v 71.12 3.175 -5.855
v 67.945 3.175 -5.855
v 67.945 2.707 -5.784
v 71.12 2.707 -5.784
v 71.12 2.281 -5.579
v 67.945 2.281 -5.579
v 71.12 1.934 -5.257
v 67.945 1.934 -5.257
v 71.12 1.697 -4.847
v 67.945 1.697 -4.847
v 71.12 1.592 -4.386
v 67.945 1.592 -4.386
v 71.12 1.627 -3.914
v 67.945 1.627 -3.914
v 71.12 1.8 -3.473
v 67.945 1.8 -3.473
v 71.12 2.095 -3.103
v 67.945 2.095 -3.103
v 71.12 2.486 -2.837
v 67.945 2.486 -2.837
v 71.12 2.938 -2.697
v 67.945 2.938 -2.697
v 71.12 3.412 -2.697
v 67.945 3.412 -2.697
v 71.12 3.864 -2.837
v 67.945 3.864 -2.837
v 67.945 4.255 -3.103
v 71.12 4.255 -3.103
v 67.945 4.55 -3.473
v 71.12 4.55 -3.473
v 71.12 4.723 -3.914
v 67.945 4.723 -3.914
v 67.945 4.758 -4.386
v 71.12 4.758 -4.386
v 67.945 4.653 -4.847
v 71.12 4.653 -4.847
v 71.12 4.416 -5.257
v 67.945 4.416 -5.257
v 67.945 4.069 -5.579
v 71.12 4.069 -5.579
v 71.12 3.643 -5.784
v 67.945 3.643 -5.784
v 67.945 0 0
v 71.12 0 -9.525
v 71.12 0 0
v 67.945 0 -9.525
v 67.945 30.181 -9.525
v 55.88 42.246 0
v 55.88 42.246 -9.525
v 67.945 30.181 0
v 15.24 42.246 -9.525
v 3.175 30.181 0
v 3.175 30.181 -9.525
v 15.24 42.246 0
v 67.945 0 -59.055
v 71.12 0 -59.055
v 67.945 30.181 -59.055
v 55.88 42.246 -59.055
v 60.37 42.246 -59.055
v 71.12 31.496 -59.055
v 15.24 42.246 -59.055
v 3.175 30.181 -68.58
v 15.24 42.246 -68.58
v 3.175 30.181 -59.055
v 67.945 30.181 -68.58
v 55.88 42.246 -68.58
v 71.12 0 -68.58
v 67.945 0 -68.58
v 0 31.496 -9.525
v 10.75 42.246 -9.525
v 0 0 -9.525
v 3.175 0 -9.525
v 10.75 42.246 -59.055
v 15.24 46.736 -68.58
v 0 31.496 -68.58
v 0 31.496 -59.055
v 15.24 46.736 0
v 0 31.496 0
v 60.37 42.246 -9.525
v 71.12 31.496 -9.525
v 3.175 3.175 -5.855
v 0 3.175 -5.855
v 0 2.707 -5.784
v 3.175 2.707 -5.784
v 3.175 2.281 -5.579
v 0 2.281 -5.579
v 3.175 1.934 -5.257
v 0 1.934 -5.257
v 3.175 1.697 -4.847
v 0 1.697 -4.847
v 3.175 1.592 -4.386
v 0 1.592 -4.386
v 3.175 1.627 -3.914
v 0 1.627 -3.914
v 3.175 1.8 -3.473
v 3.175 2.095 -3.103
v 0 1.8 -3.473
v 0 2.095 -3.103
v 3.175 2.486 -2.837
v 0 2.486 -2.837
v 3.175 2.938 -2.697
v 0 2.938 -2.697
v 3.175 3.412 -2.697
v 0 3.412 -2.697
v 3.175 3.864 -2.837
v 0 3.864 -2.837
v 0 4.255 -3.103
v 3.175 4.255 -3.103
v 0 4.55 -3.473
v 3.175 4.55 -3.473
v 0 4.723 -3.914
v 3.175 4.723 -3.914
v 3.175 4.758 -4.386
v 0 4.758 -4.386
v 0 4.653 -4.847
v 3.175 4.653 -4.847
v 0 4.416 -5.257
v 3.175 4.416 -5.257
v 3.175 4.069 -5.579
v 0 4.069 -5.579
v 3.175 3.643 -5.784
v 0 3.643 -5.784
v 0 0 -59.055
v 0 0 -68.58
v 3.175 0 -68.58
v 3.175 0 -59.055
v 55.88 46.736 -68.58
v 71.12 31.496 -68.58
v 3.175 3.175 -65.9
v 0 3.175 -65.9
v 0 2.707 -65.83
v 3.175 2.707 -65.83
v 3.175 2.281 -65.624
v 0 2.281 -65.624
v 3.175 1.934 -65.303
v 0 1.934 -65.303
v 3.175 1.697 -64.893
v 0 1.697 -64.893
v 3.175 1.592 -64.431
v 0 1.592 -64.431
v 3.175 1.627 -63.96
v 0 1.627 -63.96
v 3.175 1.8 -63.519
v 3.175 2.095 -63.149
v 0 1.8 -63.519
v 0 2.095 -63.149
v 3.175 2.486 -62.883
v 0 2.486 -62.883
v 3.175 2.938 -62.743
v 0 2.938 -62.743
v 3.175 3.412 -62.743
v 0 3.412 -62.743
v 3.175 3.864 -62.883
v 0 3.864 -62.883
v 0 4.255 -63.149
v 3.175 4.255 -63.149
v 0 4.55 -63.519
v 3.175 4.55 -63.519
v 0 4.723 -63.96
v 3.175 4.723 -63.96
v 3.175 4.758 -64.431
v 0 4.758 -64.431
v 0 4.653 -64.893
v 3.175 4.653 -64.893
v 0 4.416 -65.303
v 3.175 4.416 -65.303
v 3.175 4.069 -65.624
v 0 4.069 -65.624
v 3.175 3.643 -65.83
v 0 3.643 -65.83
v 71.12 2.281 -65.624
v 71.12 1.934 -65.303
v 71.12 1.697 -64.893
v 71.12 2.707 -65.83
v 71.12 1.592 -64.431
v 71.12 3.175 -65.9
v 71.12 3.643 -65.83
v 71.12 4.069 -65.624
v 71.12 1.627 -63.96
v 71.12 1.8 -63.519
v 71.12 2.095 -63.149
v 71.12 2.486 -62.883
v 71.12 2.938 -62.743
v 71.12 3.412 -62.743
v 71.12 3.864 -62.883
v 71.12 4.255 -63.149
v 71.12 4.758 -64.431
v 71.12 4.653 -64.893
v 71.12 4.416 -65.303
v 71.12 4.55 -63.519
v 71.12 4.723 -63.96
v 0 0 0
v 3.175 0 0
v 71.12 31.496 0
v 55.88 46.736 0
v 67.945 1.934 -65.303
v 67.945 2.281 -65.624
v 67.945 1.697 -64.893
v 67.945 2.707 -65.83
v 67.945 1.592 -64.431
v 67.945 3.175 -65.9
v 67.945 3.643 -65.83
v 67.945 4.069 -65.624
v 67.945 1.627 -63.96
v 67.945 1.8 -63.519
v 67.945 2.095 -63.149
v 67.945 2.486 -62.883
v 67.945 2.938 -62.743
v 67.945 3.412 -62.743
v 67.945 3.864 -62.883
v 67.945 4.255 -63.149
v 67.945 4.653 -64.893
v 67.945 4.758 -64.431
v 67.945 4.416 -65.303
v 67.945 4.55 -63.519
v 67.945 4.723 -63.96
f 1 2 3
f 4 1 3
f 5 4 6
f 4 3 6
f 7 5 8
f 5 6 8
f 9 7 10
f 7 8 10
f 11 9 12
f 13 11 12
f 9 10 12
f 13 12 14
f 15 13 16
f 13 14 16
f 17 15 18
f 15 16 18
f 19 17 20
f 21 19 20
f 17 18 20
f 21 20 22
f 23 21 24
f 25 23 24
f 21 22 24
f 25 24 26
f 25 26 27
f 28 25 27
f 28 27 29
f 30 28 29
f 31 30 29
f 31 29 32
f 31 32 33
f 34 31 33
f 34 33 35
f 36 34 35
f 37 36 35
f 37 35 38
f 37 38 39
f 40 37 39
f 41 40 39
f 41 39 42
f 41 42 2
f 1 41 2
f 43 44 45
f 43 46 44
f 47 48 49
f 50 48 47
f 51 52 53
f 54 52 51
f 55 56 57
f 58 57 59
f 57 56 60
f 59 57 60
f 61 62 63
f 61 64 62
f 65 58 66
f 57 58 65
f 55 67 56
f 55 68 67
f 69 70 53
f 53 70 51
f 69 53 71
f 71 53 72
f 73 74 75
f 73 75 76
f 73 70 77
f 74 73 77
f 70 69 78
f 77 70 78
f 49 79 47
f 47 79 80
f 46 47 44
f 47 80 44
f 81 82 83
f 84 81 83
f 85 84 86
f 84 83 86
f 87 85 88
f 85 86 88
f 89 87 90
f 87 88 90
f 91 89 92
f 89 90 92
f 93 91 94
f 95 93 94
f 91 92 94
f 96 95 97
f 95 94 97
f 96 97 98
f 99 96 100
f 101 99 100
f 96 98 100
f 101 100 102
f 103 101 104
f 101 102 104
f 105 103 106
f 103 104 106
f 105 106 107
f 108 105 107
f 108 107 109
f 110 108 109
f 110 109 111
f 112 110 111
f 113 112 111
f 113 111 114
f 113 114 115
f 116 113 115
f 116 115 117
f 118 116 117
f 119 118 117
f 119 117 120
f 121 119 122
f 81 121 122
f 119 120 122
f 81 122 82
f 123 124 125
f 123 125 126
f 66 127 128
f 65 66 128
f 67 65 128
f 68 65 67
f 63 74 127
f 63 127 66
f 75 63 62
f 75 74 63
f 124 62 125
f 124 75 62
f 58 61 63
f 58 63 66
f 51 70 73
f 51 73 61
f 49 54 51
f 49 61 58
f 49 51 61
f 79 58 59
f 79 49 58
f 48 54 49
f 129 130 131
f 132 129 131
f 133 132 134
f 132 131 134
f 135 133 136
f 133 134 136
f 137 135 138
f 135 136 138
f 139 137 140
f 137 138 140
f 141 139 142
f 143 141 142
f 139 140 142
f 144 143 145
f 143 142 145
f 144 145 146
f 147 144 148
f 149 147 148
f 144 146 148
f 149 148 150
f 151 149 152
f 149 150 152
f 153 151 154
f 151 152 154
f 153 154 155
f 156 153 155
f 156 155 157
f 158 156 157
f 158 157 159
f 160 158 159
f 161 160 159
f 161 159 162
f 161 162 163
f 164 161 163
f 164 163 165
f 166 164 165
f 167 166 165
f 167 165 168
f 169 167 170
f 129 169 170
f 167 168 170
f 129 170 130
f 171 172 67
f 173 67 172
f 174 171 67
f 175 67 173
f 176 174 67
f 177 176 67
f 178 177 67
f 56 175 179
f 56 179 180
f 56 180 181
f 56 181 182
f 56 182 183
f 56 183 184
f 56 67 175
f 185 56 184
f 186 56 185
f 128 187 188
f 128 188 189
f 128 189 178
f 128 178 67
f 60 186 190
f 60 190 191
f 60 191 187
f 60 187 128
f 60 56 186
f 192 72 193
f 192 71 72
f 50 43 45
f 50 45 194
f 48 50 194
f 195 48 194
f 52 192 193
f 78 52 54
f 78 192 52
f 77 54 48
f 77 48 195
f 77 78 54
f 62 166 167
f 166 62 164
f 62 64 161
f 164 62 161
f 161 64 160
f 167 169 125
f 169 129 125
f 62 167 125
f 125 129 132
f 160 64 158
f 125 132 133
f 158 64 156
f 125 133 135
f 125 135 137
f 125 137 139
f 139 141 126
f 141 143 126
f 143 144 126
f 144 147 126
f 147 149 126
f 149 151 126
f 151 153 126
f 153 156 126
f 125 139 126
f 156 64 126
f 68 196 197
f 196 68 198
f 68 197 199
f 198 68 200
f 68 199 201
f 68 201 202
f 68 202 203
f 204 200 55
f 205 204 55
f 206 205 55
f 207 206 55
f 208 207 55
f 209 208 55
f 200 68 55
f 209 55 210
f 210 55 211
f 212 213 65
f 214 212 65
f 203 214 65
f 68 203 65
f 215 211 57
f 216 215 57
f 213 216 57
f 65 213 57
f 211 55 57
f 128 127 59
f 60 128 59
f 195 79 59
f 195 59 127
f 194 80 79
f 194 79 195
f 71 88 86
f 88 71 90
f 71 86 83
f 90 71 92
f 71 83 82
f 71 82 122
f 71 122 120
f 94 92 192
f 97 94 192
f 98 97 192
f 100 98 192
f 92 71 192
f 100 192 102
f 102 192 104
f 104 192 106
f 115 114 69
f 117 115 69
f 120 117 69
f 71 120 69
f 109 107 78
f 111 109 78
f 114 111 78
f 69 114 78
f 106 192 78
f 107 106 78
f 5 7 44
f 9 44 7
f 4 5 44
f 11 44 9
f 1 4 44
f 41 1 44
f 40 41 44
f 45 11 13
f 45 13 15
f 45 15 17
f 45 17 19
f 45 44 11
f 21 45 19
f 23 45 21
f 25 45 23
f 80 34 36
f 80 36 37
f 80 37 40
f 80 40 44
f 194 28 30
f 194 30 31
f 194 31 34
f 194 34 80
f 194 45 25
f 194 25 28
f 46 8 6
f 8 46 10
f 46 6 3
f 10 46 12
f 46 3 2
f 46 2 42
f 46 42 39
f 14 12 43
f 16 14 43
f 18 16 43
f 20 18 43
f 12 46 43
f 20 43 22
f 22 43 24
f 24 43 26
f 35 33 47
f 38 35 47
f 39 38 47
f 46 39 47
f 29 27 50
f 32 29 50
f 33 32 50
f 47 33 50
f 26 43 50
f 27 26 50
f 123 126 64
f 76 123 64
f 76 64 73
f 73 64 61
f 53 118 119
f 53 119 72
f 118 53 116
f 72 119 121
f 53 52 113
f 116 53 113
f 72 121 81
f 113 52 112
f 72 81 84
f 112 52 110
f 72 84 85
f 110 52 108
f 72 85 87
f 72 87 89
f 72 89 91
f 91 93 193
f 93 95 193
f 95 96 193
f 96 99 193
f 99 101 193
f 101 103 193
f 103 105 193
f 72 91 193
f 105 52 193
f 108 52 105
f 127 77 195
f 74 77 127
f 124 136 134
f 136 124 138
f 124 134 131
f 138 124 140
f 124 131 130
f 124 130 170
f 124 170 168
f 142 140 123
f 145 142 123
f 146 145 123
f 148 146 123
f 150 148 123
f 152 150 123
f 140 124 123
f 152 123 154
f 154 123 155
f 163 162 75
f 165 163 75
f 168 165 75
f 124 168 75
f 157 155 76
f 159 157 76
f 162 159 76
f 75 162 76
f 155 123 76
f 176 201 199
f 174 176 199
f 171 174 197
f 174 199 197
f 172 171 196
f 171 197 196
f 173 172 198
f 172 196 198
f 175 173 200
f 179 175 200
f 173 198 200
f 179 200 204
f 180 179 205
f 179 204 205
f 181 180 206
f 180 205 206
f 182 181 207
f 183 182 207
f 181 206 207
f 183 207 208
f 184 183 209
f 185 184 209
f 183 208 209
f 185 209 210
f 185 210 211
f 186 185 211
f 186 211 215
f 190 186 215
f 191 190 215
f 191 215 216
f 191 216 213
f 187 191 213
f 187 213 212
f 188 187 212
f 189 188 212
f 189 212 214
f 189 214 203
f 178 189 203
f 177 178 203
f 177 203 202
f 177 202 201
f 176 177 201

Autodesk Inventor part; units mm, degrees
ref_plane "YZ Plane" through (0, 0, 0) normal (1, 0, 0) x (0, 1, 0)
ref_plane "XZ Plane" through (0, 0, 0) normal (0, 1, 0) x (-1, 0, 0)
ref_plane "XY Plane" through (0, 0, 0) normal (0, 0, 1) x (1, 0, 0)
sketch "Sketch1" plane through (0, 0, 0) normal (1, 0, 0) x (0, 1, 0)
  line L0 (0, 0) -> (46.736, 0)
  line L1 (46.736, 0) -> (46.736, -68.58)
  line L2 (46.736, -68.58) -> (0, -68.58)
  line L3 (0, -68.58) -> (0, 0)
  dimension "d0" = 46.736
  dimension "d1" = 68.58
extrude "Extrusion1" add sketch "Sketch1" along normal blind 71.12
chamfer "Chamfer1" distance 15.24 angle 45 2 edges at (0, 46.736, -34.29) (71.12, 46.736, -34.29)
sketch "Sketch2" plane through (0, 0, 0) normal (0, 0, 1) x (1, 0, 0)
  line L0 (55.88, 46.736) -> (71.12, 31.496) projected
  line L1 (15.24, 46.736) -> (55.88, 46.736) projected
  line L2 (0, 31.496) -> (15.24, 46.736) projected
  line L3 (0, 0) -> (0, 31.496) projected
  line L4 (0, 0) -> (71.12, 0) projected
  line L5 (71.12, 31.496) -> (71.12, 0) projected
  line L6 (0, 0) -> (71.12, 0) projected
  line L7 (15.24, 42.2459) -> (55.88, 42.2459)
  line L8 (57.658, 0) -> (15.24, 0)
  line L9 (3.175, 0) -> (67.945, 0)
  line L10 (67.945, 0) -> (67.945, 30.1809)
  line L11 (3.175, 30.1809) -> (3.175, 0)
  line L12 (3.175, 30.1809) -> (15.24, 42.2459)
  line L13 (55.88, 42.2459) -> (67.945, 30.1809)
  dimension "d12" = 3.175
  dimension "d13" = 3.175
  dimension "d36" = 3.175
  dimension "d37" = 3.175
  dimension "d38" = 3.175
  dimension "d39" = 3.175
extrude "Extrusion2" cut sketch "Sketch2" against normal blind 127 contours L4 L11 L12 L7 L13 L10
sketch "Sketch3" plane through (71.12, 0, 0) normal (1, 0, 0) x (0, 0, -1)
  line L0 (0, 31.496) -> (68.58, 31.496) projected
  line L1 (0, 31.496) -> (0, 0) projected
  line L2 (0, 0) -> (68.58, 0) projected
  line L3 (68.58, 0) -> (68.58, 31.496) projected
  line L4 (4.2672, 3.175) -> (64.3128, 3.175)
  line L5 (64.3128, 3.175) -> (64.3128, 19.177)
  line L6 (64.3128, 19.177) -> (4.2672, 19.177)
  line L7 (4.2672, 19.177) -> (4.2672, 3.175)
  dimension "d16" = 60.0456
  dimension "d17" = 68.58
  dimension "d18" = 4.2672
  dimension "d19" = 16.002
  dimension "d20" = 31.496
  dimension "d21" = 3.175
hole "Hole2" at (71.12, 3.175, -4.2672) at (71.12, 3.175, -64.3128) direction (-1, 0, 0) diameter 3.175 end through all
sketch "Sketch4" plane through (71.12, 0, 0) normal (1, 0, 0) x (0, 0, -1)
  circle A0 centre (4.2672, 3.175) radius 1.5875 projected
  circle A1 centre (64.3128, 3.175) radius 1.5875 projected
  line L0 (0, 31.496) -> (68.58, 31.496) projected
  line L1 (0, 31.496) -> (0, 0) projected
  line L2 (0, 0) -> (68.58, 0) projected
  line L3 (68.58, 0) -> (68.58, 31.496) projected
  line L4 (0, 46.736) -> (0, 31.496) projected
  line L5 (0, 31.496) -> (68.58, 31.496) projected
  line L6 (68.58, 31.496) -> (68.58, 46.736) projected
  line L7 (68.58, 46.736) -> (0, 46.736) projected
  line L8 (68.58, 0) -> (0, 0) projected
  line L9 (0, 42.2459) -> (68.58, 42.2459) projected
  line L10 (9.525, 0) -> (59.055, 0)
  line L11 (59.055, 0) -> (59.055, 42.2459)
  line L12 (59.055, 42.2459) -> (9.525, 42.2459)
  line L13 (9.525, 42.2459) -> (9.525, 0)
  dimension "d40" = 42.2459
  dimension "d41" = 68.58
  dimension "d42" = 49.53
  dimension "d43" = 9.525
extrude "Extrusion3" cut sketch "Sketch4" against normal blind 127 contours L13 L9 L11 L0 | L0 L11 L2 L13
equation "\"d18\" = -0.5 * d16 + 0.5 * d17"
equation "\"d43\" = -0.5 * d42 + 0.5 * d41"
properties part number "MotorProtector"
